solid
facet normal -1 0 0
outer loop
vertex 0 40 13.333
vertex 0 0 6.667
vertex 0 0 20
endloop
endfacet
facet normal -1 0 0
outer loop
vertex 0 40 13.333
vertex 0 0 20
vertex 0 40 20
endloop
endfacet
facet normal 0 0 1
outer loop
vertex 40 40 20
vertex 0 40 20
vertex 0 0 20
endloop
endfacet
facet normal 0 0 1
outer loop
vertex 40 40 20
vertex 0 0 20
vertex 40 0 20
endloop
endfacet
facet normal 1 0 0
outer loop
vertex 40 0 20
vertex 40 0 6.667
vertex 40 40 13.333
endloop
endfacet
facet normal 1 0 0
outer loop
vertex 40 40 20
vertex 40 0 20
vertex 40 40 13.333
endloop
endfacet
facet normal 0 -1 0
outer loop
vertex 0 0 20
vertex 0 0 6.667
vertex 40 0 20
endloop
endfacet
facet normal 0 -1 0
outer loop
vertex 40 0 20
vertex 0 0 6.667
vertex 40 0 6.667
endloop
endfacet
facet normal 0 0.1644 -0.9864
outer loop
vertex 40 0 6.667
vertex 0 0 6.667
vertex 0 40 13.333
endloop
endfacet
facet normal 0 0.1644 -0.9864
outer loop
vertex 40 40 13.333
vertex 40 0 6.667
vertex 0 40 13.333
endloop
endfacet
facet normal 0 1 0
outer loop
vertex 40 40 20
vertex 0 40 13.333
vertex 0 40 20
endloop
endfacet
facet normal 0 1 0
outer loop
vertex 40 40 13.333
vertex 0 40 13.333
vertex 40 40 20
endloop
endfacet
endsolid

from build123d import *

# Parameters (mm, degrees)
SKETCH1_W                = 40
SKETCH1_H                = 40
BOSS_EXTRUDE1_DEPTH      = 20
SURFACE_EXTRUDE1_1_BACK  = 50
SURFACE_EXTRUDE1_1_DEPTH = 100


with BuildPart() as part:
    # Sketch1 → Boss-Extrude1 (new body)
    with BuildSketch(Plane.XY):
        with Locations((20, 20)):
            Rectangle(SKETCH1_W, SKETCH1_H)
    extrude(amount=BOSS_EXTRUDE1_DEPTH)

    # SurfaceCut1: cut with a surface, the side it looks to stays
    # Surface-Extrude1: a surface, the sketch's curves swept straight by 100 mm
    with BuildLine(Plane(origin=(0, 0, 0), x_dir=(0, 0, -1), z_dir=(1, 0, 0)).offset(-SURFACE_EXTRUDE1_1_BACK), mode=Mode.PRIVATE) as surface_extrude1_1_path:
        Line((-5, -10), (-15, 50))
    surface_extrude1_1 = Shell.extrude(surface_extrude1_1_path.wire(), (1 * SURFACE_EXTRUDE1_1_DEPTH, 0 * SURFACE_EXTRUDE1_1_DEPTH, 0 * SURFACE_EXTRUDE1_1_DEPTH))
    split(bisect_by=surface_extrude1_1, keep=Keep.TOP)


solid = part.part
